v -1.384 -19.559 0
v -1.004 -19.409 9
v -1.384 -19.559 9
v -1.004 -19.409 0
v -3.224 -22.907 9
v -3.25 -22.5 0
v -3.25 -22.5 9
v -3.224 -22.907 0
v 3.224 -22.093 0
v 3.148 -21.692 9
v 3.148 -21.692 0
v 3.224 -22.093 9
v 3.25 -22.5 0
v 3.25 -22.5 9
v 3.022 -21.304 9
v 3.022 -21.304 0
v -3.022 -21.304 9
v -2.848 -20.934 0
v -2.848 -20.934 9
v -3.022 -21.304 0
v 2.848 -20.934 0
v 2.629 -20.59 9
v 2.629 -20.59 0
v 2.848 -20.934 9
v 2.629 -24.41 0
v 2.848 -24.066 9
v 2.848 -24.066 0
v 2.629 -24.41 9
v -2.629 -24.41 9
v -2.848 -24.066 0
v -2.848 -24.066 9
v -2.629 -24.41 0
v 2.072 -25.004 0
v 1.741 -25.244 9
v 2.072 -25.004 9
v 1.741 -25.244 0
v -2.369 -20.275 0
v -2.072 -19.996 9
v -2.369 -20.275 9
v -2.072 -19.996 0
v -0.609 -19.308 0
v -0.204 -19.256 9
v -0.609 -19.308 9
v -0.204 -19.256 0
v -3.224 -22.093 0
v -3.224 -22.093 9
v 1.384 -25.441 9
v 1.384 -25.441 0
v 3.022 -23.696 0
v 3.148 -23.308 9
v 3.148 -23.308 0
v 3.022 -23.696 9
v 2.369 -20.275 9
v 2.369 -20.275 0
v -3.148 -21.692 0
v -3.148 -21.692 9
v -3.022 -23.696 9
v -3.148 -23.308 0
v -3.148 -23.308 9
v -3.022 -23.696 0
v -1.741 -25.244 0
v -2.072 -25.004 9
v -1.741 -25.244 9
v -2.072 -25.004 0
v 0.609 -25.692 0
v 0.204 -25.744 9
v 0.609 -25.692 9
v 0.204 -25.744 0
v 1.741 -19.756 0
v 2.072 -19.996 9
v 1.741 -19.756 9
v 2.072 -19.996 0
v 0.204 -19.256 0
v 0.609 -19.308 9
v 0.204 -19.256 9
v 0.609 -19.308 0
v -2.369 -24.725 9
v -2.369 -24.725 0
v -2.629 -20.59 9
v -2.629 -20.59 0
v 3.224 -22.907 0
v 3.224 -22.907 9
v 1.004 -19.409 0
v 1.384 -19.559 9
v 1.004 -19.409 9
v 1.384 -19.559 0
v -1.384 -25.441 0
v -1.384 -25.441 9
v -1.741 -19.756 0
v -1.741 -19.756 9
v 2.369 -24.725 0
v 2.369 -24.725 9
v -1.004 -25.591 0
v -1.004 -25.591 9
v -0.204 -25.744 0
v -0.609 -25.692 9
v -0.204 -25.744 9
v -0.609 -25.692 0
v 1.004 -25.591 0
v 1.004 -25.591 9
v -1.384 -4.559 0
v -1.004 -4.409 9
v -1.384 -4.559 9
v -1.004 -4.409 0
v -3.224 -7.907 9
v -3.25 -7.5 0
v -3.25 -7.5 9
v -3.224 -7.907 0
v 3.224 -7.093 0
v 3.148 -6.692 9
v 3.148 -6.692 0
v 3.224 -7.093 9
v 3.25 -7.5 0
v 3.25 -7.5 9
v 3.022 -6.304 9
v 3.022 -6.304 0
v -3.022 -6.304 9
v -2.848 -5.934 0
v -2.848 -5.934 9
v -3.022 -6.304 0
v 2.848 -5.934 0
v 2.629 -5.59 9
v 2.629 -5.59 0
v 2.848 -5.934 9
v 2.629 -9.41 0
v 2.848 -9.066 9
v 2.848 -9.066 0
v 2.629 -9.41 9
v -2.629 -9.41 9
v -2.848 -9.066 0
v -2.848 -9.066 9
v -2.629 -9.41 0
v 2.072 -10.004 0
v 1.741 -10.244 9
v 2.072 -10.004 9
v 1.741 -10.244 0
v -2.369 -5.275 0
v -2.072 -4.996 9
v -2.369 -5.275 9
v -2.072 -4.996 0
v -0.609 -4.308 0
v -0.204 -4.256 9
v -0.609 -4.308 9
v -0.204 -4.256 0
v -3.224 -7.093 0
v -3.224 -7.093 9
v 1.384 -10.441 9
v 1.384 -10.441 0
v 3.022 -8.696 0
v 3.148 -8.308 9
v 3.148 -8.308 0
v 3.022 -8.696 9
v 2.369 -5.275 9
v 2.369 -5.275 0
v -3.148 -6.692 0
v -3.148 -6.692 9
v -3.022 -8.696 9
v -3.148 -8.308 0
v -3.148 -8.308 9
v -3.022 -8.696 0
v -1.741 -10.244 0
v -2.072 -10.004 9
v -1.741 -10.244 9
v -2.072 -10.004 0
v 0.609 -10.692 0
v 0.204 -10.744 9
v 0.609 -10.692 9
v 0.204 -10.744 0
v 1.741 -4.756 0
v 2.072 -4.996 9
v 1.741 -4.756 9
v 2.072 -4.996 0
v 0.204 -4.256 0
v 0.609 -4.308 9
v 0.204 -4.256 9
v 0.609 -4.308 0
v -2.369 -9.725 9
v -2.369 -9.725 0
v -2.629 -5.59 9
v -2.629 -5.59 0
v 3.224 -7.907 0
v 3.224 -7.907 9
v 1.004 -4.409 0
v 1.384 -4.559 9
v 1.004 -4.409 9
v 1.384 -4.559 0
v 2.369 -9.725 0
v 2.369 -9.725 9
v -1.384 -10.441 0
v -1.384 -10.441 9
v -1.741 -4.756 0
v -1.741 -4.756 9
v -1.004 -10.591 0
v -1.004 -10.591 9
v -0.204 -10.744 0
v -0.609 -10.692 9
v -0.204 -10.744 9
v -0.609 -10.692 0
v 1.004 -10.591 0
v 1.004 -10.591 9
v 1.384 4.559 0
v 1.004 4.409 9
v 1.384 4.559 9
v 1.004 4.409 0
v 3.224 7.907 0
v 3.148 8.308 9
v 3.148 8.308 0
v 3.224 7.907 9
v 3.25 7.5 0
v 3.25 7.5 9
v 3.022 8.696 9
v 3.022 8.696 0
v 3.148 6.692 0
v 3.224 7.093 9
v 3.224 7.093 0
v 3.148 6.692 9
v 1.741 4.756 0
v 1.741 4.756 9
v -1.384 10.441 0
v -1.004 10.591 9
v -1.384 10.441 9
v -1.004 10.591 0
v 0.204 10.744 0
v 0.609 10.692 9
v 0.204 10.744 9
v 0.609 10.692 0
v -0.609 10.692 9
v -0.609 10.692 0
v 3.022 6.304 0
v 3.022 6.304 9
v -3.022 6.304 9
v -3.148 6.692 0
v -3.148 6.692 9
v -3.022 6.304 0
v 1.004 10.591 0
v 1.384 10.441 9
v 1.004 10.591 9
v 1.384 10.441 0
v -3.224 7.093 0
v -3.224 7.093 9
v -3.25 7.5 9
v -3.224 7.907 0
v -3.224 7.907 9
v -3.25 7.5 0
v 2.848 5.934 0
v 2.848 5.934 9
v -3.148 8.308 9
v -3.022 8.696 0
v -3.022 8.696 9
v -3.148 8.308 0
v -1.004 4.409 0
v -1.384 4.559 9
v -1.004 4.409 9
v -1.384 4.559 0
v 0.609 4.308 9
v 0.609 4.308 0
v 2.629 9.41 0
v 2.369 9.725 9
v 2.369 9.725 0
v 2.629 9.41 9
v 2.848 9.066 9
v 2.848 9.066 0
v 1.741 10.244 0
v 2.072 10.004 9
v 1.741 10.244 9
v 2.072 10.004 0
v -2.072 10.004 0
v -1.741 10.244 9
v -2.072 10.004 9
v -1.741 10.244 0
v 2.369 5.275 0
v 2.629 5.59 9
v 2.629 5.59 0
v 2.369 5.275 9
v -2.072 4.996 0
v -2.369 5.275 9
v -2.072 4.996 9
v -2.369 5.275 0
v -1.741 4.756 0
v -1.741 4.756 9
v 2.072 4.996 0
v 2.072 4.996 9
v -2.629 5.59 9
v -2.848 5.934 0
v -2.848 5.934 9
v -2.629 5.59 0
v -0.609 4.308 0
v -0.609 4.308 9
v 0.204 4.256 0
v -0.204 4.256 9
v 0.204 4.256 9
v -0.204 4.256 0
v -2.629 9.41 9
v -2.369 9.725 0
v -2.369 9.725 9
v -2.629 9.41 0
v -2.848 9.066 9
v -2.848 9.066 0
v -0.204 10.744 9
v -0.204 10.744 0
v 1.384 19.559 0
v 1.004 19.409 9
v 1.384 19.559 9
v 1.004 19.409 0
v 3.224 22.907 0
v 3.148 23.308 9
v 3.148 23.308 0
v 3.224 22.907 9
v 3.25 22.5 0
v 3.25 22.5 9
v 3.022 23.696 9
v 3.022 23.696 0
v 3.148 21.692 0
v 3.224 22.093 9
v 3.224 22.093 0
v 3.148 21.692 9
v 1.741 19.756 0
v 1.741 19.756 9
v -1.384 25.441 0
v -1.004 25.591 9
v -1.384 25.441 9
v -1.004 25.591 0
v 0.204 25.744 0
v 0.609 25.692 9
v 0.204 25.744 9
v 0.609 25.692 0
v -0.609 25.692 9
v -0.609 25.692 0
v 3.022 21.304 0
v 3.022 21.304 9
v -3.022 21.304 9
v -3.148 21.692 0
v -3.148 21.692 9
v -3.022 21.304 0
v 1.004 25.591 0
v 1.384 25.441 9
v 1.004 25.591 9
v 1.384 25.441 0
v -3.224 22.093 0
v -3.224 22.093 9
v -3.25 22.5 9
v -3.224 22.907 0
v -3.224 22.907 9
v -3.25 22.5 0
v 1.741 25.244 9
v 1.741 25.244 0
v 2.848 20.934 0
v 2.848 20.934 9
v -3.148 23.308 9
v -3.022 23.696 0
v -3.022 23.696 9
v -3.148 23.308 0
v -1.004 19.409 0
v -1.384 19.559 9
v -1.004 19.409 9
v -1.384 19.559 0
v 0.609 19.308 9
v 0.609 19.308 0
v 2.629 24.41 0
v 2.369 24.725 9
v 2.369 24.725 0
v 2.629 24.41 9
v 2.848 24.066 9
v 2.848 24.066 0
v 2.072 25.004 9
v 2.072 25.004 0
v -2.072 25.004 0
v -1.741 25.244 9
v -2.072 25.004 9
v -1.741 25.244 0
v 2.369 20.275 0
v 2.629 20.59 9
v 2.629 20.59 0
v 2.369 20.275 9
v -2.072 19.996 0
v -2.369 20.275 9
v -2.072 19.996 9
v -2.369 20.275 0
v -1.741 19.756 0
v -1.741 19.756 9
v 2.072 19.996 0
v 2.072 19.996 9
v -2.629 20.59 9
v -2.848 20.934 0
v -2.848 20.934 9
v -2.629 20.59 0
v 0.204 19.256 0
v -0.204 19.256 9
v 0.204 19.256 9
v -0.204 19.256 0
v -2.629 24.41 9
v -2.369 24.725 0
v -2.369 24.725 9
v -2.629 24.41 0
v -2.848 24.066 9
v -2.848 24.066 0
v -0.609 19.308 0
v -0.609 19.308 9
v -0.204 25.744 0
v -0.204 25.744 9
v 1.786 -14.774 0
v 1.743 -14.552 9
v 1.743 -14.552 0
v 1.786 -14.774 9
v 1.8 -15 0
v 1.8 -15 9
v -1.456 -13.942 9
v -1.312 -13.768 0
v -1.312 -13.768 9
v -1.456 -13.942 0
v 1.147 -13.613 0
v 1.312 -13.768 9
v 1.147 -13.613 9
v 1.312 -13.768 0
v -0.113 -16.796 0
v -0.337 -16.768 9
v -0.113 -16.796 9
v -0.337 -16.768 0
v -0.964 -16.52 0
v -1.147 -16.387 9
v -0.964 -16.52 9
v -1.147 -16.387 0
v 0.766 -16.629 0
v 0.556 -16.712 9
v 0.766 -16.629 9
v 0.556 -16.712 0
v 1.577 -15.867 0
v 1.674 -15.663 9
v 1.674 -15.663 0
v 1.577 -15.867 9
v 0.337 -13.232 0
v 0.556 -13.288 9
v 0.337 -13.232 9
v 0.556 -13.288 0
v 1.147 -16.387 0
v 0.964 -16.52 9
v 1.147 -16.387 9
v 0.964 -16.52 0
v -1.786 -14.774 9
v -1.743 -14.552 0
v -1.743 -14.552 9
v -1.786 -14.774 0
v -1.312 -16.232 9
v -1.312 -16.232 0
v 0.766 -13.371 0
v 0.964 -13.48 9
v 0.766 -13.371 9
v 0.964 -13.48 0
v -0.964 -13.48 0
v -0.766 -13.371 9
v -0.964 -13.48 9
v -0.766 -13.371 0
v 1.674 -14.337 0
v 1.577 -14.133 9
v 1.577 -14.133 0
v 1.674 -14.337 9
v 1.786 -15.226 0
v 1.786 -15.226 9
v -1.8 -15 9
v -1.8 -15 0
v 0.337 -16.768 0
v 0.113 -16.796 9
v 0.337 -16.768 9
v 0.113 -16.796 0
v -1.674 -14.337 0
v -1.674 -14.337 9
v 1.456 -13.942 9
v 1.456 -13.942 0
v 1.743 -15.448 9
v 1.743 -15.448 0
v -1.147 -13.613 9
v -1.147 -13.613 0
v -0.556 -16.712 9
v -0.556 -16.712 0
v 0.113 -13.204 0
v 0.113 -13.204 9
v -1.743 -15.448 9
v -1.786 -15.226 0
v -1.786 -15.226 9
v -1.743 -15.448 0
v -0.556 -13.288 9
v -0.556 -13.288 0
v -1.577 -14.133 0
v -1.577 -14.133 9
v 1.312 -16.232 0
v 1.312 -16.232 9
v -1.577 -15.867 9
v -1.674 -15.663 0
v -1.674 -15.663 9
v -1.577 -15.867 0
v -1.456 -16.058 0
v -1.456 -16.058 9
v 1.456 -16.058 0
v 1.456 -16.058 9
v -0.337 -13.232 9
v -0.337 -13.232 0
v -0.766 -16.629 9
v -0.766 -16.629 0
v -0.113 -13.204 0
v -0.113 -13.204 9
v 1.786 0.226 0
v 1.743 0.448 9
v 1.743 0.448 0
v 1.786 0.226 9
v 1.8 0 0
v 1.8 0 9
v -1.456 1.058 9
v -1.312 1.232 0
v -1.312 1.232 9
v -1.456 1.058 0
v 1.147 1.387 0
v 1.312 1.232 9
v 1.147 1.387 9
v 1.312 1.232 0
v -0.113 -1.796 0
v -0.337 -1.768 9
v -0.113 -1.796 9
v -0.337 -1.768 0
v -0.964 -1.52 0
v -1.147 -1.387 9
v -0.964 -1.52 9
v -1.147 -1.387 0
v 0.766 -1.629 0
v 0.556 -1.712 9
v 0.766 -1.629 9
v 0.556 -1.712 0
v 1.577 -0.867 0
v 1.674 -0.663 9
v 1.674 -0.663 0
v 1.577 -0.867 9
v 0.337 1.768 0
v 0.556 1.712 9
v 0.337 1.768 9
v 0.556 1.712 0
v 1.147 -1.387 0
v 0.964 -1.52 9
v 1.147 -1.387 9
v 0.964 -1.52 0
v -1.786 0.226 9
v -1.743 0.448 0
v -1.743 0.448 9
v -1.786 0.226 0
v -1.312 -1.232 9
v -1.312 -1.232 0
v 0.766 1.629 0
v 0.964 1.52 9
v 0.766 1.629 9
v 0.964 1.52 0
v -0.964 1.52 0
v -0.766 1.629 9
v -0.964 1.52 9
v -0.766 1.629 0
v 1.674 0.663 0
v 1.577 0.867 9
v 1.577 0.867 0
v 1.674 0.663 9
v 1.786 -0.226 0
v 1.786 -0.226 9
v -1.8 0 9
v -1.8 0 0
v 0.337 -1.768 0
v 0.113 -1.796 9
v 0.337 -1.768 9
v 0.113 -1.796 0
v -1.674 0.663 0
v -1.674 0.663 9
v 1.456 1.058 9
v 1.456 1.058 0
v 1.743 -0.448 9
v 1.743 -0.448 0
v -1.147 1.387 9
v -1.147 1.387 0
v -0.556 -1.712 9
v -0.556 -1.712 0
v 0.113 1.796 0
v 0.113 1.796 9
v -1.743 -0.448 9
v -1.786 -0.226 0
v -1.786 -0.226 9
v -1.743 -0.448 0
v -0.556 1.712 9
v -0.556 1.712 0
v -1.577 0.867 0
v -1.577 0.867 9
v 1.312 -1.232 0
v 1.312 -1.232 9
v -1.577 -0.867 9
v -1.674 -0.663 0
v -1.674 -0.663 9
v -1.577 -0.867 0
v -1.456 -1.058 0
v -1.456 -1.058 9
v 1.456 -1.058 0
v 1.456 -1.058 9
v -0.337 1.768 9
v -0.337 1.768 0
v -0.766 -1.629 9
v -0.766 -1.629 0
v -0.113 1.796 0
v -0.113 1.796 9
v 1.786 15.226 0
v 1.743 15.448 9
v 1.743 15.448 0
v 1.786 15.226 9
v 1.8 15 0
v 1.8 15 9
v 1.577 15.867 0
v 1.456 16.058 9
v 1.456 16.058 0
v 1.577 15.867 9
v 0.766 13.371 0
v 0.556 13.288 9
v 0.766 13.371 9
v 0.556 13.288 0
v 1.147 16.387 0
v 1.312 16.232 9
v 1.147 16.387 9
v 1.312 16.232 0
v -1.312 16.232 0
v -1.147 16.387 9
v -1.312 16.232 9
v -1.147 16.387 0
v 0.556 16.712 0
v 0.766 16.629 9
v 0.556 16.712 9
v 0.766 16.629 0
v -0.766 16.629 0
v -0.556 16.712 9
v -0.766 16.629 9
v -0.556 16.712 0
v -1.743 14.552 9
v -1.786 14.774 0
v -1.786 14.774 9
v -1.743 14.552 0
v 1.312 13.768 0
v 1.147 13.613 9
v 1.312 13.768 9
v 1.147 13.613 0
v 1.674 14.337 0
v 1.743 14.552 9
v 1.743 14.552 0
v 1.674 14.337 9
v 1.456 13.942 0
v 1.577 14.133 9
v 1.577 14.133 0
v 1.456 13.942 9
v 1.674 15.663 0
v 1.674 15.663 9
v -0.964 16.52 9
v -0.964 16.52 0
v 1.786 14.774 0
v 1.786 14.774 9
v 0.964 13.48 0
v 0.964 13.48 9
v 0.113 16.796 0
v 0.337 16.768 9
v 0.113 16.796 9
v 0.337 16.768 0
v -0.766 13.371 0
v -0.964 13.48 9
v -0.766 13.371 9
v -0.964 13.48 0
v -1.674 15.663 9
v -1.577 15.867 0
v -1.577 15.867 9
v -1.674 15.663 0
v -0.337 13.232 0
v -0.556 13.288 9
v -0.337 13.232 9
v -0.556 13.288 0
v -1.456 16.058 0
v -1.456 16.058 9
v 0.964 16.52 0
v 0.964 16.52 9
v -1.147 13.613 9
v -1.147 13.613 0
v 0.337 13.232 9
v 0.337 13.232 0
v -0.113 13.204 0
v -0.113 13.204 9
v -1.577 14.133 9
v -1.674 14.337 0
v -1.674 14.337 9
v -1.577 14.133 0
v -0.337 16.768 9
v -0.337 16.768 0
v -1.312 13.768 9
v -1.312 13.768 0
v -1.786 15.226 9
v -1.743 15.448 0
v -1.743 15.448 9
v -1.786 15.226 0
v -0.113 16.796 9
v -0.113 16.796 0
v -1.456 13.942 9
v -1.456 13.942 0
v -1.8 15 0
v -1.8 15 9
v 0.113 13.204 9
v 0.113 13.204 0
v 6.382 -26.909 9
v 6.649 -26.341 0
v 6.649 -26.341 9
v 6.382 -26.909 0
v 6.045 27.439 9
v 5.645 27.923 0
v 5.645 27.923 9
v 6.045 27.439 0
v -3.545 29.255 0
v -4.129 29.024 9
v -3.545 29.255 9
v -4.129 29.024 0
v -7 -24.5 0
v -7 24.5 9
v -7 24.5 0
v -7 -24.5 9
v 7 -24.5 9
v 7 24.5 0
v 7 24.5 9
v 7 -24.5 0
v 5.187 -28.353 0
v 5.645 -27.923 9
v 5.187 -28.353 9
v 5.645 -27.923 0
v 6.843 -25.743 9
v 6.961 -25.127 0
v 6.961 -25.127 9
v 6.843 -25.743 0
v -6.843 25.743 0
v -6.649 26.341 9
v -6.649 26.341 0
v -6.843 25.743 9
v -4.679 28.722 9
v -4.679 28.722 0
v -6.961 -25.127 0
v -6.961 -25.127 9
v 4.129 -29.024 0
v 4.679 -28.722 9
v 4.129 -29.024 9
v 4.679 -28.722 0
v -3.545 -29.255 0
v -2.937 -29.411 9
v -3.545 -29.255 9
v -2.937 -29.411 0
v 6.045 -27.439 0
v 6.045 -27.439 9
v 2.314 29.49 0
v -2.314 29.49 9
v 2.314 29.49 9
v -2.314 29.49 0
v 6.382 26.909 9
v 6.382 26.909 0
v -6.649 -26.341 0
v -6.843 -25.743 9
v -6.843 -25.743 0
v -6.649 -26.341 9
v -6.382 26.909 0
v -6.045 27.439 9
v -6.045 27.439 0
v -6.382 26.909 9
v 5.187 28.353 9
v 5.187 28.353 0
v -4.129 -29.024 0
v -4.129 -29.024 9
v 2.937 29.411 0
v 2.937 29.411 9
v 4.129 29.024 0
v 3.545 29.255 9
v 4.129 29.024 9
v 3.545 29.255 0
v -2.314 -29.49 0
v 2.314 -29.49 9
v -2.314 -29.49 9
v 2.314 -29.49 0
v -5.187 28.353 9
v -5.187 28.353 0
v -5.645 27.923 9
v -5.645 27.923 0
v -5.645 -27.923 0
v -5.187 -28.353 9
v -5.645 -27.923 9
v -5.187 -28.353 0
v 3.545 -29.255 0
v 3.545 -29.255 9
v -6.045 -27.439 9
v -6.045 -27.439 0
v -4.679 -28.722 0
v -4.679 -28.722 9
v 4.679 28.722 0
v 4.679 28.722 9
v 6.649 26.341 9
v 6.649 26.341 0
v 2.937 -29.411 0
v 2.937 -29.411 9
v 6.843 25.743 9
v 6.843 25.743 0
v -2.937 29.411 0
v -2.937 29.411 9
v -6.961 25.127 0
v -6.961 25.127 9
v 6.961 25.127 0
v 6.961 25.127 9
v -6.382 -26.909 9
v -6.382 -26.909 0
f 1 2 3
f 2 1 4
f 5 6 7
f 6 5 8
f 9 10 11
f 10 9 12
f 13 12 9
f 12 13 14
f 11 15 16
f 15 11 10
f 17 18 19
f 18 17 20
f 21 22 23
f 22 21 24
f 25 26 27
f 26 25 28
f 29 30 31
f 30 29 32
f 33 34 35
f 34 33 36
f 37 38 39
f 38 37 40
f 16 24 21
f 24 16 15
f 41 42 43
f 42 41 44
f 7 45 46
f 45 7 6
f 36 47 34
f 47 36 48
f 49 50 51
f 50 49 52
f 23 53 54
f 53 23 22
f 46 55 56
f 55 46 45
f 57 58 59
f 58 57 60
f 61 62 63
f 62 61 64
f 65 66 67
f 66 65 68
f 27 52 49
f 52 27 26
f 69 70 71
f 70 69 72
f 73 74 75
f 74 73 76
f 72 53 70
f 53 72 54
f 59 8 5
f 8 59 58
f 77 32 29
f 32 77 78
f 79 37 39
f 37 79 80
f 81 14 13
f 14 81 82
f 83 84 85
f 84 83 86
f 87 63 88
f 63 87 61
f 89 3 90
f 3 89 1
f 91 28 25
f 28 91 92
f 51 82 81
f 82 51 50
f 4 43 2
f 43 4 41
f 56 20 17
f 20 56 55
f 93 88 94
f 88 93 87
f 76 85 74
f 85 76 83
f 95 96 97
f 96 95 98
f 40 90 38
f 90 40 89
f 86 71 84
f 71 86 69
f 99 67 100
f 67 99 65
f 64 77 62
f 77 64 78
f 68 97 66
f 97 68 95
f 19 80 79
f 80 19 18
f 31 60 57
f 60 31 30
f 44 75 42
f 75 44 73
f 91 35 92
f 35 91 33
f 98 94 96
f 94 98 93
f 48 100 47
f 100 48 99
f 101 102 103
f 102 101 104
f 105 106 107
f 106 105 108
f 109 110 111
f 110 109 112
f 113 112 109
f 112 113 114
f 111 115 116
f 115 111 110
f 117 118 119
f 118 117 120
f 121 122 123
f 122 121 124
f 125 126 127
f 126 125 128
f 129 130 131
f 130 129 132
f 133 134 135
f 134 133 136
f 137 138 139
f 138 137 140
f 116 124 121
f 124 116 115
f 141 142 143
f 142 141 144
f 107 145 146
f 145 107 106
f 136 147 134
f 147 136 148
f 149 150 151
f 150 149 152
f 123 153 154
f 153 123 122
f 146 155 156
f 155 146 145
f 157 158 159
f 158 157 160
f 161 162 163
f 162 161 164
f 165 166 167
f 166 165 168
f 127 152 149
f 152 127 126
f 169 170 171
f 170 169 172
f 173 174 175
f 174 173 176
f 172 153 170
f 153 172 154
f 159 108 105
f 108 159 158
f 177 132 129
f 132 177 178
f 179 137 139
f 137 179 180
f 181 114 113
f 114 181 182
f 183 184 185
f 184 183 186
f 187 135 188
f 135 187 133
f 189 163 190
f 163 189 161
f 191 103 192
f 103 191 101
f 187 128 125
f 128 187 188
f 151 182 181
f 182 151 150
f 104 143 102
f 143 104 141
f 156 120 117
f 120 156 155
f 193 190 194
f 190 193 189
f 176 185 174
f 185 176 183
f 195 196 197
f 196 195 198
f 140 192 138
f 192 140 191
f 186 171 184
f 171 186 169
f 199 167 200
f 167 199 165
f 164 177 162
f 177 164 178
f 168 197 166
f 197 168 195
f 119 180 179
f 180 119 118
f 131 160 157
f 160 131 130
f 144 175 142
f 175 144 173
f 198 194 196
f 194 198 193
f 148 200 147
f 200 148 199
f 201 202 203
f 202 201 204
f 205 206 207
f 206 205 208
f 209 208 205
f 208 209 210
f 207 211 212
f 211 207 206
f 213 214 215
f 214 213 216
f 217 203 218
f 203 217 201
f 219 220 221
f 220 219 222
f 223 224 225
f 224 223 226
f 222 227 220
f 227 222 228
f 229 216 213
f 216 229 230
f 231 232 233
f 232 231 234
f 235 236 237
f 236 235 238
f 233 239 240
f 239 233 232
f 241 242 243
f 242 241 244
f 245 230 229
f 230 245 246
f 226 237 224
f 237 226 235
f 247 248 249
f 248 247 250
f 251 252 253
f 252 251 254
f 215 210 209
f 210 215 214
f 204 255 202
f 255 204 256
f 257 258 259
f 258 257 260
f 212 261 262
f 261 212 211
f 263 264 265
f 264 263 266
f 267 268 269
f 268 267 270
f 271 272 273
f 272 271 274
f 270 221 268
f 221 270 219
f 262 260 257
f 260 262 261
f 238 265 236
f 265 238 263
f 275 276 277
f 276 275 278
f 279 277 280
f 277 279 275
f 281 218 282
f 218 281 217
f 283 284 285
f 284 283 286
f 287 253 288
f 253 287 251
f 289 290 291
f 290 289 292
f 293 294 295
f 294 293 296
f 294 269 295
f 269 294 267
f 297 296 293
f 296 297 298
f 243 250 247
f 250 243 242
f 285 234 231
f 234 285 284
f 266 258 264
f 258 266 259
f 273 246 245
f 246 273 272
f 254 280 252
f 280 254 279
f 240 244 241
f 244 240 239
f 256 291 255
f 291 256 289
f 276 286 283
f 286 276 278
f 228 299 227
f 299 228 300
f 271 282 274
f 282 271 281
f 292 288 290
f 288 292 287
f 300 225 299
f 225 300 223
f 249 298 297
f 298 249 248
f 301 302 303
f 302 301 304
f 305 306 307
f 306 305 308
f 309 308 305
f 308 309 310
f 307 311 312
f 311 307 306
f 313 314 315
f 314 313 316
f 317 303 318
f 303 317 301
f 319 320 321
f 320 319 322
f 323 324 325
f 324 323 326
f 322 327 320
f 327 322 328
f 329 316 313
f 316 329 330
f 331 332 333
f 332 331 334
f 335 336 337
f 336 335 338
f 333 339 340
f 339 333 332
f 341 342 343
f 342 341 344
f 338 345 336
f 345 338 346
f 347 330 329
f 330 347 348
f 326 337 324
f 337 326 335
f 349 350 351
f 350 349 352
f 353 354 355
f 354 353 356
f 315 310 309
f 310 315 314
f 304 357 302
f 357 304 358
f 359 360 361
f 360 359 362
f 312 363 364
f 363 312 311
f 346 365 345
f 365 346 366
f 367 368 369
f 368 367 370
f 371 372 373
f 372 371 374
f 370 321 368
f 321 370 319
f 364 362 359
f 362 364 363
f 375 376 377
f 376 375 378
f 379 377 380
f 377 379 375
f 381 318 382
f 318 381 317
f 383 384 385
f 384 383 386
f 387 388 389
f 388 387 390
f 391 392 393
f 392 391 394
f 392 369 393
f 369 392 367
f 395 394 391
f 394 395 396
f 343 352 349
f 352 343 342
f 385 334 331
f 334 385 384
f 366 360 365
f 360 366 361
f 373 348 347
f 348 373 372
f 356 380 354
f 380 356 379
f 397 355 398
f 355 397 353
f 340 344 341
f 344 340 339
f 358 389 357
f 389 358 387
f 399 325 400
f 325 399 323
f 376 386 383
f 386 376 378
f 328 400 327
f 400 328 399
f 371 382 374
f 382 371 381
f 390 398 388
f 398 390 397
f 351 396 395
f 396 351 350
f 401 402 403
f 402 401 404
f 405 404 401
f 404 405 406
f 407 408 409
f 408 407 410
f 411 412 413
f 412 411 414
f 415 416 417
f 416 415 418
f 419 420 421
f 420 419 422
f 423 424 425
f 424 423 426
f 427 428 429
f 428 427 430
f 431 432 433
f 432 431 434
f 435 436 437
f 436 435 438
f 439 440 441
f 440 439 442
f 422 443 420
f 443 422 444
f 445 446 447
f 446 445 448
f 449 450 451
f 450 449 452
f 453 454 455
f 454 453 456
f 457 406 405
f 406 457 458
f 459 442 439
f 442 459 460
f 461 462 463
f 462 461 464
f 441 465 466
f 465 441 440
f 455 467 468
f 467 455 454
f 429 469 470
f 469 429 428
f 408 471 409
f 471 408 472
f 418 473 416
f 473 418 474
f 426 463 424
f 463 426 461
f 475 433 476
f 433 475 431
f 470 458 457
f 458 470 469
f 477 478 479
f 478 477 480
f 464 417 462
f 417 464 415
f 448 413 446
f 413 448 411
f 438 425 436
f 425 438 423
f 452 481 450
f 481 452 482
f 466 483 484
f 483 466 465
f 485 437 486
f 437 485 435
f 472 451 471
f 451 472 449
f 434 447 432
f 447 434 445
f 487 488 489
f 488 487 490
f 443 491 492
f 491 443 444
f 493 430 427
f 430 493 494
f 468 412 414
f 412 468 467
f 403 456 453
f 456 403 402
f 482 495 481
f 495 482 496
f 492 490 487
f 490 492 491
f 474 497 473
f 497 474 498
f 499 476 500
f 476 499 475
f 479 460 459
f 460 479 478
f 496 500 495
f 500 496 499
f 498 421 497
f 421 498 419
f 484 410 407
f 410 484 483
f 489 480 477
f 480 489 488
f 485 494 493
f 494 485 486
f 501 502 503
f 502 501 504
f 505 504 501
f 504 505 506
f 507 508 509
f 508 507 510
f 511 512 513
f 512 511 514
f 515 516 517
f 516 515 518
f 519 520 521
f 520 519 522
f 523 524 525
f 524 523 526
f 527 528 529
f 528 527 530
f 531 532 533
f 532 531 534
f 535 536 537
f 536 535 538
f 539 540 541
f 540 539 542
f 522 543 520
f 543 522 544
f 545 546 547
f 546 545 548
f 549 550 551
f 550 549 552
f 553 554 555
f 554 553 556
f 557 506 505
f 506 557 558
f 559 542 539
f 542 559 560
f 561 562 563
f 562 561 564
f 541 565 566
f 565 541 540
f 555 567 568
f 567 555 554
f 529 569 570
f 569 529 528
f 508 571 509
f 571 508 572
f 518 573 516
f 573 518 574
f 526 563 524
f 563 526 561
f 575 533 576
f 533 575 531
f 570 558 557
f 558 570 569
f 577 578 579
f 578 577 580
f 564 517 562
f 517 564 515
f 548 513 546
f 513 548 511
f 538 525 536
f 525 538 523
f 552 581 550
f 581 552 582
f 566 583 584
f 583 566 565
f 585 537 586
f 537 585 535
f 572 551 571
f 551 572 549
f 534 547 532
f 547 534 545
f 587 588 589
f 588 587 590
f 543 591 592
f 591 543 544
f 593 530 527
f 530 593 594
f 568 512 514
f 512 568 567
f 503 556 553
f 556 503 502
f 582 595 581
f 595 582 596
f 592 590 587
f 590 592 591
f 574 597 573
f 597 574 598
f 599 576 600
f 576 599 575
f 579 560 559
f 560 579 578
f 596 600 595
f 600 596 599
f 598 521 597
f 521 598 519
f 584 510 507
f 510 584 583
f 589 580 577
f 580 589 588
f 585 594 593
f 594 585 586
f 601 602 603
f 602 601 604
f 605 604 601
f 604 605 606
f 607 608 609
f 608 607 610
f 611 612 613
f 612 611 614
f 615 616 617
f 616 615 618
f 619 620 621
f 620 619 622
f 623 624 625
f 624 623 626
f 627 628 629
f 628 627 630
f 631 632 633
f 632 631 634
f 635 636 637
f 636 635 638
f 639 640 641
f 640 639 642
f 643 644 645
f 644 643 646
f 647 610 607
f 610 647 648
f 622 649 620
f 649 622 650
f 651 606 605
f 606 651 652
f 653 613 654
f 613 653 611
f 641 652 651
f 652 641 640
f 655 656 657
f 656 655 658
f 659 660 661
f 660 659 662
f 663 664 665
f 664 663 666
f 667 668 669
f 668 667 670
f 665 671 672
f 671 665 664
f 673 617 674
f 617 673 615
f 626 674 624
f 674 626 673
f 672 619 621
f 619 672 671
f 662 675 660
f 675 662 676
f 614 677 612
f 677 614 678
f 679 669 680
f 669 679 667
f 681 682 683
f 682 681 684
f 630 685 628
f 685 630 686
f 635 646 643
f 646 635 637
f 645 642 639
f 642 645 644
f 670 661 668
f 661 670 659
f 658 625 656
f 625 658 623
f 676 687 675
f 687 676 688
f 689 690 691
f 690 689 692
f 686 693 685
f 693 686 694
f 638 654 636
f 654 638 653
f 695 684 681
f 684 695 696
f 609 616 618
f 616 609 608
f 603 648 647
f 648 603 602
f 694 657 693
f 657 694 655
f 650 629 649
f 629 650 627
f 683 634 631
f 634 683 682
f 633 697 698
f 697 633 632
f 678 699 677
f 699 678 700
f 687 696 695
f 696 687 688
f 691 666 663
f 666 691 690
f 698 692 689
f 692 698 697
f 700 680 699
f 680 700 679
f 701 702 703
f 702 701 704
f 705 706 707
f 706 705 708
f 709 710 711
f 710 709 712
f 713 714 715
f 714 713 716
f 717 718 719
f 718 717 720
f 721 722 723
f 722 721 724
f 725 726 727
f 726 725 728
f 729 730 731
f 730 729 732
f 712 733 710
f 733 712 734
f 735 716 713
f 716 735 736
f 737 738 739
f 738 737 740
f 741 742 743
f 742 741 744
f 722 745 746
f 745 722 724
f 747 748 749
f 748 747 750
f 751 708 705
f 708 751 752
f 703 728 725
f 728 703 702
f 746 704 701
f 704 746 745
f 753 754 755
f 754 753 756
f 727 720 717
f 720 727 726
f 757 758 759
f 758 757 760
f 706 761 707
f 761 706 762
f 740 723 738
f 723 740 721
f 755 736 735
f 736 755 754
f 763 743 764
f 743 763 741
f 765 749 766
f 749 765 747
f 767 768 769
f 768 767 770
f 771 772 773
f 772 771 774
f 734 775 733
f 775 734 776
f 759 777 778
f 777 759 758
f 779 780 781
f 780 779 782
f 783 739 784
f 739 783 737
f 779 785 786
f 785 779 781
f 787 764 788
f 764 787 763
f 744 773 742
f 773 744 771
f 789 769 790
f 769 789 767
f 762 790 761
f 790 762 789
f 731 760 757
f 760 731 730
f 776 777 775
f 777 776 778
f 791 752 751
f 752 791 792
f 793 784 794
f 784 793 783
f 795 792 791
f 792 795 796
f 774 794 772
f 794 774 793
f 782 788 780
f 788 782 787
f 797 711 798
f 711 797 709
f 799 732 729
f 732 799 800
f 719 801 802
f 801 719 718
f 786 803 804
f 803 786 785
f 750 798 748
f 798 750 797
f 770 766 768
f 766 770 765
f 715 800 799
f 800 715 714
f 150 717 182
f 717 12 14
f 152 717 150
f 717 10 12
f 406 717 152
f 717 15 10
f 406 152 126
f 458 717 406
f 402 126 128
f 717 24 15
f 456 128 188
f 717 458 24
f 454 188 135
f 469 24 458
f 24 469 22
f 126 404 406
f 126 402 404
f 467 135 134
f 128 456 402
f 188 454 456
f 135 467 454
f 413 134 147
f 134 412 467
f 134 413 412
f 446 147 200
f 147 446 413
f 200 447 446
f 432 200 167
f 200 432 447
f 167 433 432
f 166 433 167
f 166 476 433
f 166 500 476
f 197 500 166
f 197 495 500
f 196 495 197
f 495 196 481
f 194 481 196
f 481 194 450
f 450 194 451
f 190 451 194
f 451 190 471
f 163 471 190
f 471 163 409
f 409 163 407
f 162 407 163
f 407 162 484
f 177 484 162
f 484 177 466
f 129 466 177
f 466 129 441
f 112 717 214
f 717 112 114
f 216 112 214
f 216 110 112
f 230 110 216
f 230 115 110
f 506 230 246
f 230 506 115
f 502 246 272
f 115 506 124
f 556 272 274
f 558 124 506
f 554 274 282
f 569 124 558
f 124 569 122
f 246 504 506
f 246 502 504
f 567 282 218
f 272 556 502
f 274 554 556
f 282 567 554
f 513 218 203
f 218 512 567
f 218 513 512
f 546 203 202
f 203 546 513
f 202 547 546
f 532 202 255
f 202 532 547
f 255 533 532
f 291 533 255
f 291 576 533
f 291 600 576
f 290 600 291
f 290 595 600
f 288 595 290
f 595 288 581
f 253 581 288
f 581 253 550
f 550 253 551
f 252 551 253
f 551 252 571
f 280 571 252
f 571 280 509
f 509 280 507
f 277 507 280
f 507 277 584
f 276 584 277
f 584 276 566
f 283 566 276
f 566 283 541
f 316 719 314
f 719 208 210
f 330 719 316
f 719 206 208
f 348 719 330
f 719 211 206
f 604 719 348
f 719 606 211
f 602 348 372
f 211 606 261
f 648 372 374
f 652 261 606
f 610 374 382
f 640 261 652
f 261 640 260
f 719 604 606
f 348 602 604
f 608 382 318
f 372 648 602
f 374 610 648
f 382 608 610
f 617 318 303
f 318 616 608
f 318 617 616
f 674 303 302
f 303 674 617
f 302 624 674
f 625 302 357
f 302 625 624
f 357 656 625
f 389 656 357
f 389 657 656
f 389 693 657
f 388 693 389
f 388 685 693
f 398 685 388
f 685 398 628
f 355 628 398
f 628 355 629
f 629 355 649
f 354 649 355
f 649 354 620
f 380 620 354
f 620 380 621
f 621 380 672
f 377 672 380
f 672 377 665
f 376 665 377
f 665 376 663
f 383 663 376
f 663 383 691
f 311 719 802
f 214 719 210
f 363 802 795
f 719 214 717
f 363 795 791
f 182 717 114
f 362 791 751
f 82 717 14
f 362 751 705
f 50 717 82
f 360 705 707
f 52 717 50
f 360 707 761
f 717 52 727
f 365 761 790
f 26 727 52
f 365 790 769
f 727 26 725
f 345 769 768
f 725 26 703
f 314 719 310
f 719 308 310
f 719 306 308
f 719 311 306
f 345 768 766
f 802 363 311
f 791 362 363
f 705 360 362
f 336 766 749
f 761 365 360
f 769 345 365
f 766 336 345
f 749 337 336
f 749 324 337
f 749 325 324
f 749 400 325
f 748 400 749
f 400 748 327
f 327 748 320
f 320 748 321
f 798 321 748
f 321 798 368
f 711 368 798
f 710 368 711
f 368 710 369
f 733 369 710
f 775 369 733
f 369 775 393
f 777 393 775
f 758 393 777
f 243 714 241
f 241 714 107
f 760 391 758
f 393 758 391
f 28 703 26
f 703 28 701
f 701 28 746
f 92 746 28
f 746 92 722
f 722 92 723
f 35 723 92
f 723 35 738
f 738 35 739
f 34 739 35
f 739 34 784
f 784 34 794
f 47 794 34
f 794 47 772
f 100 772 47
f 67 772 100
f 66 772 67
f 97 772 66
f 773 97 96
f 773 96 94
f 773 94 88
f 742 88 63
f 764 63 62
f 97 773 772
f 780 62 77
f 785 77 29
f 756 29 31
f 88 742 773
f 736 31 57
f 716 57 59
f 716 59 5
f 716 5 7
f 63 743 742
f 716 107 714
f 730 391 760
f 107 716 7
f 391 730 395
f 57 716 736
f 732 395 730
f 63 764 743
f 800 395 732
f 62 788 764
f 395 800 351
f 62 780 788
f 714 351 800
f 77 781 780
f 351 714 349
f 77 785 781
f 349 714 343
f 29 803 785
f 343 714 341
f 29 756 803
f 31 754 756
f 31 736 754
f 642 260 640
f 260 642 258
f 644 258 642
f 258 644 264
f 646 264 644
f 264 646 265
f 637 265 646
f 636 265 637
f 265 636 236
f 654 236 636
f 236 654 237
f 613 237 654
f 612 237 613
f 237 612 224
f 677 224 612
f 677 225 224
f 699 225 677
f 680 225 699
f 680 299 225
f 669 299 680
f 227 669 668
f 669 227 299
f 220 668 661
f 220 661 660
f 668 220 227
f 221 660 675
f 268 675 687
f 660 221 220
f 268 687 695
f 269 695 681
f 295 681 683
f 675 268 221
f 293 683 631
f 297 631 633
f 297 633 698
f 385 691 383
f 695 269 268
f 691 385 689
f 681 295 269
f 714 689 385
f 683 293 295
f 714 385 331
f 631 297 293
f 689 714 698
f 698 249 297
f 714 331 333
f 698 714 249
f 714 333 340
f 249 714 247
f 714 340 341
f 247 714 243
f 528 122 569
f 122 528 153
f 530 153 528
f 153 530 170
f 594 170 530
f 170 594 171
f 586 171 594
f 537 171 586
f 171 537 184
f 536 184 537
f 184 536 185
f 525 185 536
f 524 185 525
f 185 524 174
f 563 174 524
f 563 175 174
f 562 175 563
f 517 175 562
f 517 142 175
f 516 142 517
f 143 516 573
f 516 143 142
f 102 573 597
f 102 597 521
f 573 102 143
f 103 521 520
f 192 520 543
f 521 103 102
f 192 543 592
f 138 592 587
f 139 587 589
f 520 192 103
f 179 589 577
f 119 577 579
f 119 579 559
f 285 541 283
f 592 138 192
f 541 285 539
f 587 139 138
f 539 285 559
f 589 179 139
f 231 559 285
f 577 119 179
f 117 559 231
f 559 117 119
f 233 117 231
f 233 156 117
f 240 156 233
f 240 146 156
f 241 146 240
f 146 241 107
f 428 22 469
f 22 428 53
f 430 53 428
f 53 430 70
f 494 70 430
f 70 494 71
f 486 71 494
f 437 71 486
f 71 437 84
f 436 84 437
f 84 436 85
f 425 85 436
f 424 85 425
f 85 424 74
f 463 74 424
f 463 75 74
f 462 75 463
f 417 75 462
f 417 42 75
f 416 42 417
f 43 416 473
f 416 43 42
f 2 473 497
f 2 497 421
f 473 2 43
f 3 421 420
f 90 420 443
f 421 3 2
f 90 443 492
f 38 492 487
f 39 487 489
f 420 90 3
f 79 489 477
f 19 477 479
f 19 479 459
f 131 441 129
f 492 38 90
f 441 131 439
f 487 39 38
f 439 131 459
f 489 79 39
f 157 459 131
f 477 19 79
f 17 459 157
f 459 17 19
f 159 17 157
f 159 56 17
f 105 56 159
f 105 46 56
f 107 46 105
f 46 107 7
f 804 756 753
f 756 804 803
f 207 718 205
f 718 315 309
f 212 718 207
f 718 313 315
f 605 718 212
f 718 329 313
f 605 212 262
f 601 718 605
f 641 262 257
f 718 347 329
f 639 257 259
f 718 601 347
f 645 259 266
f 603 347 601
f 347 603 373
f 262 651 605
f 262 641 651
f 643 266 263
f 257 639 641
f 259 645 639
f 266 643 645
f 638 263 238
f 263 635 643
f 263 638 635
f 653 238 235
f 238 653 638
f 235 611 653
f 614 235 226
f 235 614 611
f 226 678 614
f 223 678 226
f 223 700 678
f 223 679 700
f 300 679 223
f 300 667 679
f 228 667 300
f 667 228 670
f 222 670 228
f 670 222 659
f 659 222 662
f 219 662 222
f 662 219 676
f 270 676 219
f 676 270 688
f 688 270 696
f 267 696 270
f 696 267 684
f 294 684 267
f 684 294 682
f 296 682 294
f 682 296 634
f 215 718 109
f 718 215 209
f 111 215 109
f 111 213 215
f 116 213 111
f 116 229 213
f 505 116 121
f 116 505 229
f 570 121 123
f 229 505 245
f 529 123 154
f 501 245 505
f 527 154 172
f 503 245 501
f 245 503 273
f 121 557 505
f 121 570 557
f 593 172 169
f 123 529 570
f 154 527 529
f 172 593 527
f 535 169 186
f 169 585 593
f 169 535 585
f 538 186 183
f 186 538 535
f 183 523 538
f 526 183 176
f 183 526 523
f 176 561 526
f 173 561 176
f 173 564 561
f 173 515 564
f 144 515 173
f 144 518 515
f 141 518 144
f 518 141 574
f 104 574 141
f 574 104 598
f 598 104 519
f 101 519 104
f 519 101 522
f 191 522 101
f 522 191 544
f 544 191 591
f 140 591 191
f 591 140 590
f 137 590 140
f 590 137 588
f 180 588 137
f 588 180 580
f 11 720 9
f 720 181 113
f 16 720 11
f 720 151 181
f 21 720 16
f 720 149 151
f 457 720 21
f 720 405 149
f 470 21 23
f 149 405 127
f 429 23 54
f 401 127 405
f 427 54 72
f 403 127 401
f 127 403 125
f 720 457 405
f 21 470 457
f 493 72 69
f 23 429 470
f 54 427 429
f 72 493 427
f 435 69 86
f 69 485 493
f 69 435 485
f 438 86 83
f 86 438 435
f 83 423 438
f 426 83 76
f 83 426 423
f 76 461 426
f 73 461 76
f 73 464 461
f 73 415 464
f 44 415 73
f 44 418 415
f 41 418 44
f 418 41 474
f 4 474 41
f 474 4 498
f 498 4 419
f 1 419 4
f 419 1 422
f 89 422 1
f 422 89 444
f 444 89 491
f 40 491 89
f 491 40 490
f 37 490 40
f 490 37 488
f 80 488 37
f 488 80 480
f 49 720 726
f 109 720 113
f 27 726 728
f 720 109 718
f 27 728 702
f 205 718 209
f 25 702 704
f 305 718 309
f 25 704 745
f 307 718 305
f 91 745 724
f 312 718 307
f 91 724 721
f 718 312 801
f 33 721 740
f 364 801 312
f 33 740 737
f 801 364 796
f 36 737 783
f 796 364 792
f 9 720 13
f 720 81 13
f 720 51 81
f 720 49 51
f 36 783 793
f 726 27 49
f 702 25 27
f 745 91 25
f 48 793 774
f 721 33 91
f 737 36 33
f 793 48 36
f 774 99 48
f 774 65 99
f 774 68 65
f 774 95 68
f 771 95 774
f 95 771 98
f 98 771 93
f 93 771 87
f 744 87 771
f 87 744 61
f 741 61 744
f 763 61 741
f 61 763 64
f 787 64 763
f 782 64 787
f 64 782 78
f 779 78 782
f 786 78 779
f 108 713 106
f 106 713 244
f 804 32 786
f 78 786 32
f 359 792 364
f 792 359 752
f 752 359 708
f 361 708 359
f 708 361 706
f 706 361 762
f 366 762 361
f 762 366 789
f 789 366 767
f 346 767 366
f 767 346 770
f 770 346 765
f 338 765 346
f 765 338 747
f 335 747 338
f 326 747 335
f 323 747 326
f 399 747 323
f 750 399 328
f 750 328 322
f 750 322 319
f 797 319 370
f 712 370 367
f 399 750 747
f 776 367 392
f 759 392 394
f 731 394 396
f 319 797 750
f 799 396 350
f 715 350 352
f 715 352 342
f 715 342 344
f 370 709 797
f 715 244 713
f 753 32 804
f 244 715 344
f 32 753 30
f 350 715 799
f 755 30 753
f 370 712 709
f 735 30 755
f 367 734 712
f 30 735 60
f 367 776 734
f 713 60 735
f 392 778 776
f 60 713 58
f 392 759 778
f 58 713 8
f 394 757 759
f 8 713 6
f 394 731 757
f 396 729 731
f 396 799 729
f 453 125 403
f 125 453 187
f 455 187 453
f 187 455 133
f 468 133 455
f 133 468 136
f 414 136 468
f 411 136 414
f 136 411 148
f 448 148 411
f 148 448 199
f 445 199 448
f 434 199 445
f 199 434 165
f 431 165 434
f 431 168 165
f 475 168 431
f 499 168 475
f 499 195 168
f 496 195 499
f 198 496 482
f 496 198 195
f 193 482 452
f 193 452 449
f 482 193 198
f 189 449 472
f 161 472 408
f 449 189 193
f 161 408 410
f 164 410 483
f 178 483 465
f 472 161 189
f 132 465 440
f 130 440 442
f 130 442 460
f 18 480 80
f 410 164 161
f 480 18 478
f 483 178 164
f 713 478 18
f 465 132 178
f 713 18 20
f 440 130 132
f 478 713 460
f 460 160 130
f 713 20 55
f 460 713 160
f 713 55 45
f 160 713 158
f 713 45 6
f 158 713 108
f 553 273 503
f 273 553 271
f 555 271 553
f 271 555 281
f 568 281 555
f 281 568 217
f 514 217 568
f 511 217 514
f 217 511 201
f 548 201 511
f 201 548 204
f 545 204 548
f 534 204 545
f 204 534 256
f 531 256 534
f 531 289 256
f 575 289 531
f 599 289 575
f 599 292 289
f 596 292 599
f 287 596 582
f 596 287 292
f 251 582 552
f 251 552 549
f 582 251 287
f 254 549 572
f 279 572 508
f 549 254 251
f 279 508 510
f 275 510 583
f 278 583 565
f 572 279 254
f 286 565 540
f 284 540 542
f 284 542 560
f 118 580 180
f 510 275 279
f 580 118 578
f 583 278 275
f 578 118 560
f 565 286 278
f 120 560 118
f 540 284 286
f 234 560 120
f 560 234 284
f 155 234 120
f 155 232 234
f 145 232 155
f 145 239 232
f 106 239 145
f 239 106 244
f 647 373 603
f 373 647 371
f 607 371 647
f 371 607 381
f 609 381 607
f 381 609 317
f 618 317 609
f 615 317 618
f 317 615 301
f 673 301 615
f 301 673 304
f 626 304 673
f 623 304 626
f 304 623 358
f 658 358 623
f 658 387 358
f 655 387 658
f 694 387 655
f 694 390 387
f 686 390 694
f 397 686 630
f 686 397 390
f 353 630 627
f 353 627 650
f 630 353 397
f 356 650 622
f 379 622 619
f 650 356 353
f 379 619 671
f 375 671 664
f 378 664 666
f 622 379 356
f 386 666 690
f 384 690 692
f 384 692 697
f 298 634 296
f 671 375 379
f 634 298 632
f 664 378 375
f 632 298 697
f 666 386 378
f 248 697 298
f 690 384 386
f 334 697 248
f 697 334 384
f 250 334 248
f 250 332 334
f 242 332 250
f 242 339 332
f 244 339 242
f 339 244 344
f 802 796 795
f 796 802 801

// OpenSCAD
$fn = 50;

difference() {
	union() {
		hull() {
			translate(v = [-2.0, 24.5, 0]) {
				cylinder(h = 9, r = 5);
			}
			translate(v = [2.0, 24.5, 0]) {
				cylinder(h = 9, r = 5);
			}
			translate(v = [-2.0, -24.5, 0]) {
				cylinder(h = 9, r = 5);
			}
			translate(v = [2.0, -24.5, 0]) {
				cylinder(h = 9, r = 5);
			}
		}
	}
	union() {
		translate(v = [0.0, -22.5, 0]) {
			translate(v = [0, 0, -100]) {
				cylinder(h = 200, r = 3.25);
			}
		}
		translate(v = [0.0, -7.5, 0]) {
			translate(v = [0, 0, -100]) {
				cylinder(h = 200, r = 3.25);
			}
		}
		translate(v = [0.0, 7.5, 0]) {
			translate(v = [0, 0, -100]) {
				cylinder(h = 200, r = 3.25);
			}
		}
		translate(v = [0.0, 22.5, 0]) {
			translate(v = [0, 0, -100]) {
				cylinder(h = 200, r = 3.25);
			}
		}
		translate(v = [0.0, -22.5, 0]) {
			translate(v = [0, 0, -100]) {
				cylinder(h = 200, r = 1.8);
			}
		}
		translate(v = [0.0, -15.0, 0]) {
			translate(v = [0, 0, -100]) {
				cylinder(h = 200, r = 1.8);
			}
		}
		translate(v = [0.0, -7.5, 0]) {
			translate(v = [0, 0, -100]) {
				cylinder(h = 200, r = 1.8);
			}
		}
		translate(v = [0, 0, -100]) {
			cylinder(h = 200, r = 1.8);
		}
		translate(v = [0.0, 7.5, 0]) {
			translate(v = [0, 0, -100]) {
				cylinder(h = 200, r = 1.8);
			}
		}
		translate(v = [0.0, 15.0, 0]) {
			translate(v = [0, 0, -100]) {
				cylinder(h = 200, r = 1.8);
			}
		}
		translate(v = [0.0, 22.5, 0]) {
			translate(v = [0, 0, -100]) {
				cylinder(h = 200, r = 1.8);
			}
		}
	}
}
